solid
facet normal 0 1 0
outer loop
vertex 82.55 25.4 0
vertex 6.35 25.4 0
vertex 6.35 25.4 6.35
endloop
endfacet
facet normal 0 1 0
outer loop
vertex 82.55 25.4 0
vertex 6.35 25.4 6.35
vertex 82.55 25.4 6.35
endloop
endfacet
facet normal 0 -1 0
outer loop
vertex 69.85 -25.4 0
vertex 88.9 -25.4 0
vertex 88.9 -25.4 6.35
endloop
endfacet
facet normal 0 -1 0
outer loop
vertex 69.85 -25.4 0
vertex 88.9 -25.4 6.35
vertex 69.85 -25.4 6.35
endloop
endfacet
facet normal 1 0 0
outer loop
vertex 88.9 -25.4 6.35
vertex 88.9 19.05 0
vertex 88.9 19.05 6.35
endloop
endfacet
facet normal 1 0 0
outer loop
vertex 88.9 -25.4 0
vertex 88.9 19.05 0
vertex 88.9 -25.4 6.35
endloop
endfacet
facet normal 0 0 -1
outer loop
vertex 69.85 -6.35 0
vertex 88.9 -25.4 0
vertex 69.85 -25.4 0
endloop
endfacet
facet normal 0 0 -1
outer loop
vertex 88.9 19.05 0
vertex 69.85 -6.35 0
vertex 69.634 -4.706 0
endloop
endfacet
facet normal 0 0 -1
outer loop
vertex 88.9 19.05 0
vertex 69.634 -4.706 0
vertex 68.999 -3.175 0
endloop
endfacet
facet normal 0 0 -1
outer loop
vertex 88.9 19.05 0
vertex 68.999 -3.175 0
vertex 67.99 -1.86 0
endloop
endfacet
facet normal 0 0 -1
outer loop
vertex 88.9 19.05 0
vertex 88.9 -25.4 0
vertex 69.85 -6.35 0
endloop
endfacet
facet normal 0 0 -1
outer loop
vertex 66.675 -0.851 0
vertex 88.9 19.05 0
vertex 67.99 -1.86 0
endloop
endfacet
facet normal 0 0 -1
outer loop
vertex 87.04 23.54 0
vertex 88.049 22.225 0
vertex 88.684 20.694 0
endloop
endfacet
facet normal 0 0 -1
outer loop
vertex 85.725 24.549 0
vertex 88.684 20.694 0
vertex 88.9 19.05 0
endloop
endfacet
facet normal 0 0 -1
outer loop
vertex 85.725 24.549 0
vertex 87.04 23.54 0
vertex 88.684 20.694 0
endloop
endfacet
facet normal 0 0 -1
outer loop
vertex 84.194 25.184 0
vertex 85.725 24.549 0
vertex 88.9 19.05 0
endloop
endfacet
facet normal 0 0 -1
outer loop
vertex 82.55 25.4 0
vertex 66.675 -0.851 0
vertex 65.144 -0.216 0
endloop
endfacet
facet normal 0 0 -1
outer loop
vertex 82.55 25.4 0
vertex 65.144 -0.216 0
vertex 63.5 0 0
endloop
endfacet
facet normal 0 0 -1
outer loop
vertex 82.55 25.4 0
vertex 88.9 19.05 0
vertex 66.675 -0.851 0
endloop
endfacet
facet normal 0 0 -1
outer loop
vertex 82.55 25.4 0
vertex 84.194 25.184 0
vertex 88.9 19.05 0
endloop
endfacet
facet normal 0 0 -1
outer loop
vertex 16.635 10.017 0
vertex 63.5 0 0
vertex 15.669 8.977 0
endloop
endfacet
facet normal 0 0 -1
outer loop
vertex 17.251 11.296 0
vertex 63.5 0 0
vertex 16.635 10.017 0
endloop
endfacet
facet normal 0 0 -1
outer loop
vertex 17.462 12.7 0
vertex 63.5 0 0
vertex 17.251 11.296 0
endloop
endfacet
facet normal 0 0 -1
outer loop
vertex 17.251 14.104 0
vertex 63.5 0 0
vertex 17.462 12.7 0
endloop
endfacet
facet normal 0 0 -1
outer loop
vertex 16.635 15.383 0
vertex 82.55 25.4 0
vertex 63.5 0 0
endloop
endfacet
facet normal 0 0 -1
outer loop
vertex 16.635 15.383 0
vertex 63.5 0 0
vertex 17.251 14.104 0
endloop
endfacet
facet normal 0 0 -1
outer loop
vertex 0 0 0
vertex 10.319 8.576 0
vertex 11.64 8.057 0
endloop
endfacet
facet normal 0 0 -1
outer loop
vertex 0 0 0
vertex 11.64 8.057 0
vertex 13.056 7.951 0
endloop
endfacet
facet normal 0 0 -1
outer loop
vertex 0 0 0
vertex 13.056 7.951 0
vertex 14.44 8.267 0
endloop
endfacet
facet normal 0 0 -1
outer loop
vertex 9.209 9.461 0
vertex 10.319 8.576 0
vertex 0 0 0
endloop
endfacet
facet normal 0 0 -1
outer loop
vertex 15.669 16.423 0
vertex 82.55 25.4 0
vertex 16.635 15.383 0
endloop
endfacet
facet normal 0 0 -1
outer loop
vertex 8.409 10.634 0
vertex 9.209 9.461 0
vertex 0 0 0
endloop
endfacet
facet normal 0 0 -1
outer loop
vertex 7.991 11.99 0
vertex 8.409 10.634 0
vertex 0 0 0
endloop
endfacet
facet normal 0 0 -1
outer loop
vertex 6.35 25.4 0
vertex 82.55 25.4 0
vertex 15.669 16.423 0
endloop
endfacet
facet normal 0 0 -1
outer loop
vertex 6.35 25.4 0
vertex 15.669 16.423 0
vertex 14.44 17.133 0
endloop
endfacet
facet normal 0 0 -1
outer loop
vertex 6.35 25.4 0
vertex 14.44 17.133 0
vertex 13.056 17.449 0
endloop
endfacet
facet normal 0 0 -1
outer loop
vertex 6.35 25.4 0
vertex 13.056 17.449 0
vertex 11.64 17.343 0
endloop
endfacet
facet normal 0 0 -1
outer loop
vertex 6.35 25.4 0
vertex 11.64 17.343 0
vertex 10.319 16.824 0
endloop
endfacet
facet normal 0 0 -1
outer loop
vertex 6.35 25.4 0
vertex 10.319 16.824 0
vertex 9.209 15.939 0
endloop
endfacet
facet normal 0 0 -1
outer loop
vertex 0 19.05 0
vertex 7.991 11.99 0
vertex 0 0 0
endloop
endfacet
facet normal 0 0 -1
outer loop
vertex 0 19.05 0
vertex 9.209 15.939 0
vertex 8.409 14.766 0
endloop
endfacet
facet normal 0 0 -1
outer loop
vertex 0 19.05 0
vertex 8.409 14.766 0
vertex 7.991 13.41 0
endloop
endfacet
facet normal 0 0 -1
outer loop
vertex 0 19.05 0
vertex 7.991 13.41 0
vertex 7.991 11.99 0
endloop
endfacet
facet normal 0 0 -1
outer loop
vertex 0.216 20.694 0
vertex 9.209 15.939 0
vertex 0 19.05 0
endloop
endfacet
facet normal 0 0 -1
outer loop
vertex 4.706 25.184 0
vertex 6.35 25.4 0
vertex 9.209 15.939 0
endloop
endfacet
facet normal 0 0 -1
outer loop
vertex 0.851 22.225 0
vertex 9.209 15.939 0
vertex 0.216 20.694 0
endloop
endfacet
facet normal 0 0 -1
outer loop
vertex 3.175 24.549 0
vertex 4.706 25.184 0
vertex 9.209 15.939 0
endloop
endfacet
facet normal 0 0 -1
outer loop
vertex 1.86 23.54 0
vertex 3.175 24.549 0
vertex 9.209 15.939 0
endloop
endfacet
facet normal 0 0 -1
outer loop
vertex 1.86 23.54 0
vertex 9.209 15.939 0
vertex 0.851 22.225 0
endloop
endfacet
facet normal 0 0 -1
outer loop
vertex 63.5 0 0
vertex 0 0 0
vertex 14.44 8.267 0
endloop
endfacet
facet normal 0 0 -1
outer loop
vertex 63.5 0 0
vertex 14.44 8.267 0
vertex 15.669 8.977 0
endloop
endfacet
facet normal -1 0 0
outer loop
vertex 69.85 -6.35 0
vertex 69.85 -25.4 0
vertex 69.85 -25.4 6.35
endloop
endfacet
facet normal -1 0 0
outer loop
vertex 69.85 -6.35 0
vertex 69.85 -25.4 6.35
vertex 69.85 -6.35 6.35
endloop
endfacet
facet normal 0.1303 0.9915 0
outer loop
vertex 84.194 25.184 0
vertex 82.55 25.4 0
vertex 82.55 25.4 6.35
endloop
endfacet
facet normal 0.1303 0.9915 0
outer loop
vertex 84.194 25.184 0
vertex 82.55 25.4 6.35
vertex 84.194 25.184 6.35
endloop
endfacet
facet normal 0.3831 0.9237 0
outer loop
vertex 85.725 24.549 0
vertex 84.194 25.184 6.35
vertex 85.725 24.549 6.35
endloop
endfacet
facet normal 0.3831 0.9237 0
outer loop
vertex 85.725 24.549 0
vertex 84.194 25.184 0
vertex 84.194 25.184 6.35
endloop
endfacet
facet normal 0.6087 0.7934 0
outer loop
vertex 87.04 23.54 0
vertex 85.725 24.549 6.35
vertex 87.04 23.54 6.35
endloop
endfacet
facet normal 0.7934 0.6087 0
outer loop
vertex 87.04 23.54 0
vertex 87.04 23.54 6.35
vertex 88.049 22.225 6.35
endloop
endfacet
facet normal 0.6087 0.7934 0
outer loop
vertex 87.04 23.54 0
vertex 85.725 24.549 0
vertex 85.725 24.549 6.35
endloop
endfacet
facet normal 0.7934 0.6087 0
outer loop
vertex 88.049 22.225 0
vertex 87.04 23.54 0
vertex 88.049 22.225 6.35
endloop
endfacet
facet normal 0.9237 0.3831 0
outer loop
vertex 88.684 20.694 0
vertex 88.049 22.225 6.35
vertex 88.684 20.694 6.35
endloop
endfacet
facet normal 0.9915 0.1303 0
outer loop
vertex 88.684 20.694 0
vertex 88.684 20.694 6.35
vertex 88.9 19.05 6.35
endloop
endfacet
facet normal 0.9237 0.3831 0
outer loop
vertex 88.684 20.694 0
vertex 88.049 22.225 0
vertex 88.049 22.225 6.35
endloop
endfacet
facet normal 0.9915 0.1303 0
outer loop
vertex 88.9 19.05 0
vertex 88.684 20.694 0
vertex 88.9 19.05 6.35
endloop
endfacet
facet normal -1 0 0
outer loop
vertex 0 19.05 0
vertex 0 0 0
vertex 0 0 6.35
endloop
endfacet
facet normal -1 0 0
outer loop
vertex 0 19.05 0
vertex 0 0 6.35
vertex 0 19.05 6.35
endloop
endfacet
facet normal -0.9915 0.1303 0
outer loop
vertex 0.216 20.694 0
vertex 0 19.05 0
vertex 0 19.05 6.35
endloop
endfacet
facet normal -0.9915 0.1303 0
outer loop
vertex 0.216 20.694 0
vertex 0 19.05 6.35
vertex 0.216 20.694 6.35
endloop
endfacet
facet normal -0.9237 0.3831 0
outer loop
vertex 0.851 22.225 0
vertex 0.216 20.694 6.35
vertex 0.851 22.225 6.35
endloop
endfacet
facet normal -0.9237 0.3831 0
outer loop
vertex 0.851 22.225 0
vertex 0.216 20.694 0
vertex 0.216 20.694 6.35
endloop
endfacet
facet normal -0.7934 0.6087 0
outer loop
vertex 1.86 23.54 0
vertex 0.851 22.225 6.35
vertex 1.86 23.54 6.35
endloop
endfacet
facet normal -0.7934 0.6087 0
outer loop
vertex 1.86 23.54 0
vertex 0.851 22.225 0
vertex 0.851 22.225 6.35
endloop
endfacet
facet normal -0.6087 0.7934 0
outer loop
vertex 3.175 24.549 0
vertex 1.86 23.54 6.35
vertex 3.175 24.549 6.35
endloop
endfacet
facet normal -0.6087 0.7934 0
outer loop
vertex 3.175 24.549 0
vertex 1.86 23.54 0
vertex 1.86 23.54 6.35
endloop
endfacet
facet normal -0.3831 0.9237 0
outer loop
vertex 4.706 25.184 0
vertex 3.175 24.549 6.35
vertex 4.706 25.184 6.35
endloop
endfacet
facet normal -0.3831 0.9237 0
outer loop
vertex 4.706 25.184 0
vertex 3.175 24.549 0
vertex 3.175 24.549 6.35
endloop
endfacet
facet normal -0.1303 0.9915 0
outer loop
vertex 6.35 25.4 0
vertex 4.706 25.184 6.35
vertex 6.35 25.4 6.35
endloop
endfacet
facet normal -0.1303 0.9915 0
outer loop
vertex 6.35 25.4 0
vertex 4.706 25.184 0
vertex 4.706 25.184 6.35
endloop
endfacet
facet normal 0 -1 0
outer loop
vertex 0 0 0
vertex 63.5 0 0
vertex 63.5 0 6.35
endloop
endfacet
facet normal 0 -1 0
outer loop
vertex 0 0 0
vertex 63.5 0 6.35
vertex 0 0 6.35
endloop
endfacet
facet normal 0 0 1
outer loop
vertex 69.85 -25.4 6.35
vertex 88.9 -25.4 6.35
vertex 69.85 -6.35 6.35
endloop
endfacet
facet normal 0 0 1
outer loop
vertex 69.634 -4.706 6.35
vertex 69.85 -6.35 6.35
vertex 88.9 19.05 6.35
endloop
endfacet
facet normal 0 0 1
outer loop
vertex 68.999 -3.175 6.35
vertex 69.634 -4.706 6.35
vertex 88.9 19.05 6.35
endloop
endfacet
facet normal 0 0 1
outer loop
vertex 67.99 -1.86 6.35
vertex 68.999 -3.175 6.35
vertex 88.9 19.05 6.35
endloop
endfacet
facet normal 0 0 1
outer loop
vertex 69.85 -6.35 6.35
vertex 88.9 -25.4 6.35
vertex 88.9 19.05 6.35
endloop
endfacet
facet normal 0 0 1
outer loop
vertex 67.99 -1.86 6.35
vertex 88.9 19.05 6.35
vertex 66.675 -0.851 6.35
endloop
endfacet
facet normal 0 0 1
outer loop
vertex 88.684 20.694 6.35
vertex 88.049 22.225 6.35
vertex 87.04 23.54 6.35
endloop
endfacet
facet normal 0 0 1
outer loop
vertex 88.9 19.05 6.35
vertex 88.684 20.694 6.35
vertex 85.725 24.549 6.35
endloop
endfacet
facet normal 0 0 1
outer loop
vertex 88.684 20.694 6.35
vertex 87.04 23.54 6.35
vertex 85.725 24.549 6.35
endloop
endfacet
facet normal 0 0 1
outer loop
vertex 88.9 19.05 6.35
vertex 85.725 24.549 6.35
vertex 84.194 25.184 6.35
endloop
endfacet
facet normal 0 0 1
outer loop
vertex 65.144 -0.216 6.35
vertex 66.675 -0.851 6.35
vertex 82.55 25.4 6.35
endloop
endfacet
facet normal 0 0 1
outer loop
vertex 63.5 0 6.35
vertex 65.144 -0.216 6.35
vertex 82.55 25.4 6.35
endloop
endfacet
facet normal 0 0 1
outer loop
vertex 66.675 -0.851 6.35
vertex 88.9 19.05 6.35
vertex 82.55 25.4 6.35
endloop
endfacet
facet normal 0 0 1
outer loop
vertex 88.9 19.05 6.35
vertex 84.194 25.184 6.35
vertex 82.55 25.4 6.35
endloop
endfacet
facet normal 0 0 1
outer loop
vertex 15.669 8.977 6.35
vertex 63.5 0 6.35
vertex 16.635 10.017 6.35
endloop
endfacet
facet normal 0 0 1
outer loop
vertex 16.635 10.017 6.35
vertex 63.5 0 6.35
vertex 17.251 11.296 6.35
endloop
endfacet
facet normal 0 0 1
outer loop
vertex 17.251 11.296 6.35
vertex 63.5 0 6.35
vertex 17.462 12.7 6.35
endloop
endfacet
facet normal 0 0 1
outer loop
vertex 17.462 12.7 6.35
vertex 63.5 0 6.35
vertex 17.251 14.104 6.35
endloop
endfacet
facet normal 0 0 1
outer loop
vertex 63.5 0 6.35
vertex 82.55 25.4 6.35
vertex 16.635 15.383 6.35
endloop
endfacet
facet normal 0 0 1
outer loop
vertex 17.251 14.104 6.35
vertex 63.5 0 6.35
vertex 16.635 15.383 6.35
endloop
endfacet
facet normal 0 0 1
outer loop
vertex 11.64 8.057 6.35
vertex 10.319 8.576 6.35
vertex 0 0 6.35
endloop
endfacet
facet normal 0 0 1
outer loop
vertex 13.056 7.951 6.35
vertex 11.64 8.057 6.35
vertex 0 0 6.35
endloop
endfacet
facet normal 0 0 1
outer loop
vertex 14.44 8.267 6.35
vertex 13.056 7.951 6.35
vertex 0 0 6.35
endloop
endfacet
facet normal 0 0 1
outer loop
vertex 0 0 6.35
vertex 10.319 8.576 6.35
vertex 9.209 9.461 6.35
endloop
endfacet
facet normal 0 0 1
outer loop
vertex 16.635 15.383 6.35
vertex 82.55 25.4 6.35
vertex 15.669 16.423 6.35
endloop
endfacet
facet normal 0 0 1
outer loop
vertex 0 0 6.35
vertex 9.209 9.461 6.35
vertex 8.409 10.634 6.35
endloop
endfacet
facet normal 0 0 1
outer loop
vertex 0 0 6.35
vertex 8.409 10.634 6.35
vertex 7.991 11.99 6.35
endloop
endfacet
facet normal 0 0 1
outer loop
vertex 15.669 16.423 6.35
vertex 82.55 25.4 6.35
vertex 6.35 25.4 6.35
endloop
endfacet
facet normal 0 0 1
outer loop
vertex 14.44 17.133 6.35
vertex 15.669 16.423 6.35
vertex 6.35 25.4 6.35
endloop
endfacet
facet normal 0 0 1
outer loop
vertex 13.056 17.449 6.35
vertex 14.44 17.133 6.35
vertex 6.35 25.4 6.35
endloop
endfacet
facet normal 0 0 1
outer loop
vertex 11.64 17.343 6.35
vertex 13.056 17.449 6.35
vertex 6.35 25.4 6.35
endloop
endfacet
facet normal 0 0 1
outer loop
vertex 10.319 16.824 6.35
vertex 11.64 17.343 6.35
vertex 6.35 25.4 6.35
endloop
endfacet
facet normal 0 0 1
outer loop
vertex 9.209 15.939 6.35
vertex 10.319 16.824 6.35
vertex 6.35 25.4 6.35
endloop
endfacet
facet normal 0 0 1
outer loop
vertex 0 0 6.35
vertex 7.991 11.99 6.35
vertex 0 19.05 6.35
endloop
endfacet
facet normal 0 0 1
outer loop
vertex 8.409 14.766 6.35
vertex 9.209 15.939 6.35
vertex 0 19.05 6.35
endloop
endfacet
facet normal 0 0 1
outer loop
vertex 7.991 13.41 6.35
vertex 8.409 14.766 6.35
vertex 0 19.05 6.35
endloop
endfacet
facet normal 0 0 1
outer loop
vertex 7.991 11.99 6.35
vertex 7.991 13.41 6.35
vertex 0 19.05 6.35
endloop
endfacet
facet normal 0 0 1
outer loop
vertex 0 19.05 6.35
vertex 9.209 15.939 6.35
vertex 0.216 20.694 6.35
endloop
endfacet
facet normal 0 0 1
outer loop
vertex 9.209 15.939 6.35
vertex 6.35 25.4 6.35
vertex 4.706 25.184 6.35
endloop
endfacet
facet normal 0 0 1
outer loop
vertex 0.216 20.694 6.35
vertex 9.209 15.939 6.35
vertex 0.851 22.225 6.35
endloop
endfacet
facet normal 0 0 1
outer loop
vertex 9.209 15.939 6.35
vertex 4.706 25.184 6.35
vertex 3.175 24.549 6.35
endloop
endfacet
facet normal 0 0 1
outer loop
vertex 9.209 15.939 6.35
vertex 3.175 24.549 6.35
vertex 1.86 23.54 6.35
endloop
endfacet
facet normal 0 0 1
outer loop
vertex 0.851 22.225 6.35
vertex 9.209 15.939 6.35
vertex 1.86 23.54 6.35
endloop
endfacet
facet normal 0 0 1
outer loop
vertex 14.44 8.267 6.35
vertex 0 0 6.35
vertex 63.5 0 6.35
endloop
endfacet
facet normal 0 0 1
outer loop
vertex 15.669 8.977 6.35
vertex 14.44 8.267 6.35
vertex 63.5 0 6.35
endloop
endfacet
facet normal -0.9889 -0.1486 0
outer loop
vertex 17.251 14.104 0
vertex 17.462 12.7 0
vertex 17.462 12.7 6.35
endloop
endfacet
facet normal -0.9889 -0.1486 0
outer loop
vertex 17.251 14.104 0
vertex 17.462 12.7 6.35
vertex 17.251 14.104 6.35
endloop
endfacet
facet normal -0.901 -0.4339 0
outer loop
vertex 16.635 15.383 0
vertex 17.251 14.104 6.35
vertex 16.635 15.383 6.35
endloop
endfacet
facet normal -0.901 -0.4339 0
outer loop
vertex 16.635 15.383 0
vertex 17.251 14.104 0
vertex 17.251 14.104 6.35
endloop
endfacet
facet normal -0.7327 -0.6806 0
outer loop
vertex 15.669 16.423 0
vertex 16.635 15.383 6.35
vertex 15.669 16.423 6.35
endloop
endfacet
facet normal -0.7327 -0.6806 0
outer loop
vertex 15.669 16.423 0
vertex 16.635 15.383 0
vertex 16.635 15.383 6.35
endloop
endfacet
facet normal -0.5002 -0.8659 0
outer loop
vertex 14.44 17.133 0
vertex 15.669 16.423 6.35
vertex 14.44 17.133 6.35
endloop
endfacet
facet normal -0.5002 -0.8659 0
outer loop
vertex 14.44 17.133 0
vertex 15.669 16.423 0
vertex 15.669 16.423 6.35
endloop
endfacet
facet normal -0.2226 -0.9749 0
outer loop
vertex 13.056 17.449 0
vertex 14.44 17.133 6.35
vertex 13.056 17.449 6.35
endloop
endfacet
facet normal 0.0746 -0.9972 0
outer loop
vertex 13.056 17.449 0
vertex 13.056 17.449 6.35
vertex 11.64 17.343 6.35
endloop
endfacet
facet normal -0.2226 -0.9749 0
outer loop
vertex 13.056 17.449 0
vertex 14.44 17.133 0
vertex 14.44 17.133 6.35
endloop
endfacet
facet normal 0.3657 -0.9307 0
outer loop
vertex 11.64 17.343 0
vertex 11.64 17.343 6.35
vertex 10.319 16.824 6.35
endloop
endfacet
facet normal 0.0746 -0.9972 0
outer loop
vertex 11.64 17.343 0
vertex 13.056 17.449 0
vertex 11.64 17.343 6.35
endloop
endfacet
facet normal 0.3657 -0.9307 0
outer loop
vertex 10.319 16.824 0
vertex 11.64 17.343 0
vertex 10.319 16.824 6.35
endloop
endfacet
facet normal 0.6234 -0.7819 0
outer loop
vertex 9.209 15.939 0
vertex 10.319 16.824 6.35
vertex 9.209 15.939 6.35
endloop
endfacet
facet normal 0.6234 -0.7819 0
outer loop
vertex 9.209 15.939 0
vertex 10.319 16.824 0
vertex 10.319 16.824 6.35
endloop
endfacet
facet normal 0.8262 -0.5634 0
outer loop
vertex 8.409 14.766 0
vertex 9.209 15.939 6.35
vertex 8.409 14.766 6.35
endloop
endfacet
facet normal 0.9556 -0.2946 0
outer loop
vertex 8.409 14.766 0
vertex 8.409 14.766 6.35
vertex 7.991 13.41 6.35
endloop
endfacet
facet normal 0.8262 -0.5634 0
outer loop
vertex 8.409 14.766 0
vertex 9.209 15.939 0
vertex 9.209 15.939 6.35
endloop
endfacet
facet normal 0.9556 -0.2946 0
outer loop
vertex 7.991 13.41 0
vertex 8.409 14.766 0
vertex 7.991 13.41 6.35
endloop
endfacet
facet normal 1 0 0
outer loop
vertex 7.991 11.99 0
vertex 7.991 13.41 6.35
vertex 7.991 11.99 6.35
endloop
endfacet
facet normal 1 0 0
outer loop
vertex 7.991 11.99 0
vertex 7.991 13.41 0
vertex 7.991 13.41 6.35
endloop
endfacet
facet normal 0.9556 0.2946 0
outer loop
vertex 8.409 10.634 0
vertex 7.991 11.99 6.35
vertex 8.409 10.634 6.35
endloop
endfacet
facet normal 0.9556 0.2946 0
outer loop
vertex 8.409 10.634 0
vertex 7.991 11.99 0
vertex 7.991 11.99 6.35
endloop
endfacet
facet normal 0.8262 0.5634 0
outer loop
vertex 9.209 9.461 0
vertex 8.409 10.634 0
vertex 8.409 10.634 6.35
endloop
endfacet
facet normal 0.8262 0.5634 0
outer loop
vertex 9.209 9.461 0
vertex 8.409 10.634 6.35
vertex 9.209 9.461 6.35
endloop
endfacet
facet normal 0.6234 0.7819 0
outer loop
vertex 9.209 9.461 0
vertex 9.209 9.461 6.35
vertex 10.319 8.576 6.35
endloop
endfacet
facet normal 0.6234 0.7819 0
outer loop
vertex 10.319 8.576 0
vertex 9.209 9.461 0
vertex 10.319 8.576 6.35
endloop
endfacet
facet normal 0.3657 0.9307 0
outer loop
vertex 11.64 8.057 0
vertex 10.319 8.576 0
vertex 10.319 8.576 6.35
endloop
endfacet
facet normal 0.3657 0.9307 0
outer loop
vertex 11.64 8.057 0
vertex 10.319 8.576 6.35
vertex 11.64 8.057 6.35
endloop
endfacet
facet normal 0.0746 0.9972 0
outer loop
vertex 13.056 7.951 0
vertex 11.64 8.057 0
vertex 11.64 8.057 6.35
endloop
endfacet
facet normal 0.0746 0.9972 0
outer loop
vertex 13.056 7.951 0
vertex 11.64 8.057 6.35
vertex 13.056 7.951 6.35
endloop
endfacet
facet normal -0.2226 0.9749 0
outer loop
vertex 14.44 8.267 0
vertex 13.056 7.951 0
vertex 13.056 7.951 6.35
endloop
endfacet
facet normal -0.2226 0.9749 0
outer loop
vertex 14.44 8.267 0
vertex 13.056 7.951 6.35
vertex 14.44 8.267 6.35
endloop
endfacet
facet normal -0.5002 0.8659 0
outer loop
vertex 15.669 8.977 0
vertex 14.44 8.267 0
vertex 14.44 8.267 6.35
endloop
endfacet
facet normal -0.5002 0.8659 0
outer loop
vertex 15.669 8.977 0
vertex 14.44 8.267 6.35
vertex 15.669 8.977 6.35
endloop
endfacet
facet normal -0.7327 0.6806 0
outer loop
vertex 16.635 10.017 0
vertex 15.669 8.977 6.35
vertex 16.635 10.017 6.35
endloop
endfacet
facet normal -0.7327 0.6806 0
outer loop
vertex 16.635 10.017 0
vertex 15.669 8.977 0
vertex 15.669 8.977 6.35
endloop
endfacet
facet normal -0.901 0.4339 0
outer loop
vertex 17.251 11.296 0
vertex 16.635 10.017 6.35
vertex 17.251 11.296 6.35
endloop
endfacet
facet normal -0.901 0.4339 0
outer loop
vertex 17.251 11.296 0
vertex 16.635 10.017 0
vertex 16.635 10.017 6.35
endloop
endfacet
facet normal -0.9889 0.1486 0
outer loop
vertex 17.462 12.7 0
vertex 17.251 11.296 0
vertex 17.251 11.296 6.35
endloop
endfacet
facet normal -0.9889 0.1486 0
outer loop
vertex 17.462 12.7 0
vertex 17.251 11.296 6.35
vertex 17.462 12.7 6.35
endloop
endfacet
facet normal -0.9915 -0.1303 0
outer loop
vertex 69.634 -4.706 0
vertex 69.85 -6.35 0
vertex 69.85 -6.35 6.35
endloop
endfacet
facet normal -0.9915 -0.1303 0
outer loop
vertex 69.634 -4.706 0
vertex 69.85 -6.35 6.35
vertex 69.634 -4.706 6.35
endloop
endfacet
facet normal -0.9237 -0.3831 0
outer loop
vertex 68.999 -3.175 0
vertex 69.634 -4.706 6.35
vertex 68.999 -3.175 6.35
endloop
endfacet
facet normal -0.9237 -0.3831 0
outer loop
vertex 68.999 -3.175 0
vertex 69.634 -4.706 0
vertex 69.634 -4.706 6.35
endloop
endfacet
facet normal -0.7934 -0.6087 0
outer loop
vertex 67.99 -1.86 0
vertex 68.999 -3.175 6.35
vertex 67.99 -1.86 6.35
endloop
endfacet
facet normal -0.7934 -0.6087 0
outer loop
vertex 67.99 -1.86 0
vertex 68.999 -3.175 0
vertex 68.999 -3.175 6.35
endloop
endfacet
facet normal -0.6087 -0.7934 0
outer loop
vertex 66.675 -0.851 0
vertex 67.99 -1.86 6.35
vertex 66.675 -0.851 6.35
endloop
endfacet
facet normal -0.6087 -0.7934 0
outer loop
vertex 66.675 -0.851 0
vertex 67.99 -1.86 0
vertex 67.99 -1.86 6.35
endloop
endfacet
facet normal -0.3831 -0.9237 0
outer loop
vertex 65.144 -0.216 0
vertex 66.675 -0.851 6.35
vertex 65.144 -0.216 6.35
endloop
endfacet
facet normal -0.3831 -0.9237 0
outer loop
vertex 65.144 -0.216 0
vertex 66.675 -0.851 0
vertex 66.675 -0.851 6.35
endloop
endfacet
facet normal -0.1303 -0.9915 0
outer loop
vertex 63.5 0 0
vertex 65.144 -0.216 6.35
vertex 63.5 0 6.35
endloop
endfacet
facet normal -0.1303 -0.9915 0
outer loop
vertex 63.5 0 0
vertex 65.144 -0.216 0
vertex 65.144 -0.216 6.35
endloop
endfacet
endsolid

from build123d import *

# Parameters (mm, degrees)
SKETCH4_R           = 4.7625
BOSS_EXTRUDE2_DEPTH = 6.35


with BuildPart() as part:
    # Sketch4 → Boss-Extrude2 (new body)
    with BuildSketch(Plane.XY):
        with BuildLine():
            Line((0, 0), (0, 19.05))
            ThreePointArc((0, 19.05), (1.859871939, 23.540128061), (6.35, 25.4))
            Line((6.35, 25.4), (82.55, 25.4))
            ThreePointArc((82.55, 25.4), (87.040128061, 23.540128061), (88.9, 19.05))
            Line((88.9, 19.05), (88.9, -25.4))
            Line((88.9, -25.4), (69.85, -25.4))
            Line((69.85, -25.4), (69.85, -6.35))
            ThreePointArc((69.85, -6.35), (67.990128061, -1.859871939), (63.5, 0))
            Line((63.5, 0), (0, 0))
        make_face()
        with Locations((12.7, 12.7)):
            Circle(SKETCH4_R, mode=Mode.SUBTRACT)
    extrude(amount=BOSS_EXTRUDE2_DEPTH)


solid = part.part
